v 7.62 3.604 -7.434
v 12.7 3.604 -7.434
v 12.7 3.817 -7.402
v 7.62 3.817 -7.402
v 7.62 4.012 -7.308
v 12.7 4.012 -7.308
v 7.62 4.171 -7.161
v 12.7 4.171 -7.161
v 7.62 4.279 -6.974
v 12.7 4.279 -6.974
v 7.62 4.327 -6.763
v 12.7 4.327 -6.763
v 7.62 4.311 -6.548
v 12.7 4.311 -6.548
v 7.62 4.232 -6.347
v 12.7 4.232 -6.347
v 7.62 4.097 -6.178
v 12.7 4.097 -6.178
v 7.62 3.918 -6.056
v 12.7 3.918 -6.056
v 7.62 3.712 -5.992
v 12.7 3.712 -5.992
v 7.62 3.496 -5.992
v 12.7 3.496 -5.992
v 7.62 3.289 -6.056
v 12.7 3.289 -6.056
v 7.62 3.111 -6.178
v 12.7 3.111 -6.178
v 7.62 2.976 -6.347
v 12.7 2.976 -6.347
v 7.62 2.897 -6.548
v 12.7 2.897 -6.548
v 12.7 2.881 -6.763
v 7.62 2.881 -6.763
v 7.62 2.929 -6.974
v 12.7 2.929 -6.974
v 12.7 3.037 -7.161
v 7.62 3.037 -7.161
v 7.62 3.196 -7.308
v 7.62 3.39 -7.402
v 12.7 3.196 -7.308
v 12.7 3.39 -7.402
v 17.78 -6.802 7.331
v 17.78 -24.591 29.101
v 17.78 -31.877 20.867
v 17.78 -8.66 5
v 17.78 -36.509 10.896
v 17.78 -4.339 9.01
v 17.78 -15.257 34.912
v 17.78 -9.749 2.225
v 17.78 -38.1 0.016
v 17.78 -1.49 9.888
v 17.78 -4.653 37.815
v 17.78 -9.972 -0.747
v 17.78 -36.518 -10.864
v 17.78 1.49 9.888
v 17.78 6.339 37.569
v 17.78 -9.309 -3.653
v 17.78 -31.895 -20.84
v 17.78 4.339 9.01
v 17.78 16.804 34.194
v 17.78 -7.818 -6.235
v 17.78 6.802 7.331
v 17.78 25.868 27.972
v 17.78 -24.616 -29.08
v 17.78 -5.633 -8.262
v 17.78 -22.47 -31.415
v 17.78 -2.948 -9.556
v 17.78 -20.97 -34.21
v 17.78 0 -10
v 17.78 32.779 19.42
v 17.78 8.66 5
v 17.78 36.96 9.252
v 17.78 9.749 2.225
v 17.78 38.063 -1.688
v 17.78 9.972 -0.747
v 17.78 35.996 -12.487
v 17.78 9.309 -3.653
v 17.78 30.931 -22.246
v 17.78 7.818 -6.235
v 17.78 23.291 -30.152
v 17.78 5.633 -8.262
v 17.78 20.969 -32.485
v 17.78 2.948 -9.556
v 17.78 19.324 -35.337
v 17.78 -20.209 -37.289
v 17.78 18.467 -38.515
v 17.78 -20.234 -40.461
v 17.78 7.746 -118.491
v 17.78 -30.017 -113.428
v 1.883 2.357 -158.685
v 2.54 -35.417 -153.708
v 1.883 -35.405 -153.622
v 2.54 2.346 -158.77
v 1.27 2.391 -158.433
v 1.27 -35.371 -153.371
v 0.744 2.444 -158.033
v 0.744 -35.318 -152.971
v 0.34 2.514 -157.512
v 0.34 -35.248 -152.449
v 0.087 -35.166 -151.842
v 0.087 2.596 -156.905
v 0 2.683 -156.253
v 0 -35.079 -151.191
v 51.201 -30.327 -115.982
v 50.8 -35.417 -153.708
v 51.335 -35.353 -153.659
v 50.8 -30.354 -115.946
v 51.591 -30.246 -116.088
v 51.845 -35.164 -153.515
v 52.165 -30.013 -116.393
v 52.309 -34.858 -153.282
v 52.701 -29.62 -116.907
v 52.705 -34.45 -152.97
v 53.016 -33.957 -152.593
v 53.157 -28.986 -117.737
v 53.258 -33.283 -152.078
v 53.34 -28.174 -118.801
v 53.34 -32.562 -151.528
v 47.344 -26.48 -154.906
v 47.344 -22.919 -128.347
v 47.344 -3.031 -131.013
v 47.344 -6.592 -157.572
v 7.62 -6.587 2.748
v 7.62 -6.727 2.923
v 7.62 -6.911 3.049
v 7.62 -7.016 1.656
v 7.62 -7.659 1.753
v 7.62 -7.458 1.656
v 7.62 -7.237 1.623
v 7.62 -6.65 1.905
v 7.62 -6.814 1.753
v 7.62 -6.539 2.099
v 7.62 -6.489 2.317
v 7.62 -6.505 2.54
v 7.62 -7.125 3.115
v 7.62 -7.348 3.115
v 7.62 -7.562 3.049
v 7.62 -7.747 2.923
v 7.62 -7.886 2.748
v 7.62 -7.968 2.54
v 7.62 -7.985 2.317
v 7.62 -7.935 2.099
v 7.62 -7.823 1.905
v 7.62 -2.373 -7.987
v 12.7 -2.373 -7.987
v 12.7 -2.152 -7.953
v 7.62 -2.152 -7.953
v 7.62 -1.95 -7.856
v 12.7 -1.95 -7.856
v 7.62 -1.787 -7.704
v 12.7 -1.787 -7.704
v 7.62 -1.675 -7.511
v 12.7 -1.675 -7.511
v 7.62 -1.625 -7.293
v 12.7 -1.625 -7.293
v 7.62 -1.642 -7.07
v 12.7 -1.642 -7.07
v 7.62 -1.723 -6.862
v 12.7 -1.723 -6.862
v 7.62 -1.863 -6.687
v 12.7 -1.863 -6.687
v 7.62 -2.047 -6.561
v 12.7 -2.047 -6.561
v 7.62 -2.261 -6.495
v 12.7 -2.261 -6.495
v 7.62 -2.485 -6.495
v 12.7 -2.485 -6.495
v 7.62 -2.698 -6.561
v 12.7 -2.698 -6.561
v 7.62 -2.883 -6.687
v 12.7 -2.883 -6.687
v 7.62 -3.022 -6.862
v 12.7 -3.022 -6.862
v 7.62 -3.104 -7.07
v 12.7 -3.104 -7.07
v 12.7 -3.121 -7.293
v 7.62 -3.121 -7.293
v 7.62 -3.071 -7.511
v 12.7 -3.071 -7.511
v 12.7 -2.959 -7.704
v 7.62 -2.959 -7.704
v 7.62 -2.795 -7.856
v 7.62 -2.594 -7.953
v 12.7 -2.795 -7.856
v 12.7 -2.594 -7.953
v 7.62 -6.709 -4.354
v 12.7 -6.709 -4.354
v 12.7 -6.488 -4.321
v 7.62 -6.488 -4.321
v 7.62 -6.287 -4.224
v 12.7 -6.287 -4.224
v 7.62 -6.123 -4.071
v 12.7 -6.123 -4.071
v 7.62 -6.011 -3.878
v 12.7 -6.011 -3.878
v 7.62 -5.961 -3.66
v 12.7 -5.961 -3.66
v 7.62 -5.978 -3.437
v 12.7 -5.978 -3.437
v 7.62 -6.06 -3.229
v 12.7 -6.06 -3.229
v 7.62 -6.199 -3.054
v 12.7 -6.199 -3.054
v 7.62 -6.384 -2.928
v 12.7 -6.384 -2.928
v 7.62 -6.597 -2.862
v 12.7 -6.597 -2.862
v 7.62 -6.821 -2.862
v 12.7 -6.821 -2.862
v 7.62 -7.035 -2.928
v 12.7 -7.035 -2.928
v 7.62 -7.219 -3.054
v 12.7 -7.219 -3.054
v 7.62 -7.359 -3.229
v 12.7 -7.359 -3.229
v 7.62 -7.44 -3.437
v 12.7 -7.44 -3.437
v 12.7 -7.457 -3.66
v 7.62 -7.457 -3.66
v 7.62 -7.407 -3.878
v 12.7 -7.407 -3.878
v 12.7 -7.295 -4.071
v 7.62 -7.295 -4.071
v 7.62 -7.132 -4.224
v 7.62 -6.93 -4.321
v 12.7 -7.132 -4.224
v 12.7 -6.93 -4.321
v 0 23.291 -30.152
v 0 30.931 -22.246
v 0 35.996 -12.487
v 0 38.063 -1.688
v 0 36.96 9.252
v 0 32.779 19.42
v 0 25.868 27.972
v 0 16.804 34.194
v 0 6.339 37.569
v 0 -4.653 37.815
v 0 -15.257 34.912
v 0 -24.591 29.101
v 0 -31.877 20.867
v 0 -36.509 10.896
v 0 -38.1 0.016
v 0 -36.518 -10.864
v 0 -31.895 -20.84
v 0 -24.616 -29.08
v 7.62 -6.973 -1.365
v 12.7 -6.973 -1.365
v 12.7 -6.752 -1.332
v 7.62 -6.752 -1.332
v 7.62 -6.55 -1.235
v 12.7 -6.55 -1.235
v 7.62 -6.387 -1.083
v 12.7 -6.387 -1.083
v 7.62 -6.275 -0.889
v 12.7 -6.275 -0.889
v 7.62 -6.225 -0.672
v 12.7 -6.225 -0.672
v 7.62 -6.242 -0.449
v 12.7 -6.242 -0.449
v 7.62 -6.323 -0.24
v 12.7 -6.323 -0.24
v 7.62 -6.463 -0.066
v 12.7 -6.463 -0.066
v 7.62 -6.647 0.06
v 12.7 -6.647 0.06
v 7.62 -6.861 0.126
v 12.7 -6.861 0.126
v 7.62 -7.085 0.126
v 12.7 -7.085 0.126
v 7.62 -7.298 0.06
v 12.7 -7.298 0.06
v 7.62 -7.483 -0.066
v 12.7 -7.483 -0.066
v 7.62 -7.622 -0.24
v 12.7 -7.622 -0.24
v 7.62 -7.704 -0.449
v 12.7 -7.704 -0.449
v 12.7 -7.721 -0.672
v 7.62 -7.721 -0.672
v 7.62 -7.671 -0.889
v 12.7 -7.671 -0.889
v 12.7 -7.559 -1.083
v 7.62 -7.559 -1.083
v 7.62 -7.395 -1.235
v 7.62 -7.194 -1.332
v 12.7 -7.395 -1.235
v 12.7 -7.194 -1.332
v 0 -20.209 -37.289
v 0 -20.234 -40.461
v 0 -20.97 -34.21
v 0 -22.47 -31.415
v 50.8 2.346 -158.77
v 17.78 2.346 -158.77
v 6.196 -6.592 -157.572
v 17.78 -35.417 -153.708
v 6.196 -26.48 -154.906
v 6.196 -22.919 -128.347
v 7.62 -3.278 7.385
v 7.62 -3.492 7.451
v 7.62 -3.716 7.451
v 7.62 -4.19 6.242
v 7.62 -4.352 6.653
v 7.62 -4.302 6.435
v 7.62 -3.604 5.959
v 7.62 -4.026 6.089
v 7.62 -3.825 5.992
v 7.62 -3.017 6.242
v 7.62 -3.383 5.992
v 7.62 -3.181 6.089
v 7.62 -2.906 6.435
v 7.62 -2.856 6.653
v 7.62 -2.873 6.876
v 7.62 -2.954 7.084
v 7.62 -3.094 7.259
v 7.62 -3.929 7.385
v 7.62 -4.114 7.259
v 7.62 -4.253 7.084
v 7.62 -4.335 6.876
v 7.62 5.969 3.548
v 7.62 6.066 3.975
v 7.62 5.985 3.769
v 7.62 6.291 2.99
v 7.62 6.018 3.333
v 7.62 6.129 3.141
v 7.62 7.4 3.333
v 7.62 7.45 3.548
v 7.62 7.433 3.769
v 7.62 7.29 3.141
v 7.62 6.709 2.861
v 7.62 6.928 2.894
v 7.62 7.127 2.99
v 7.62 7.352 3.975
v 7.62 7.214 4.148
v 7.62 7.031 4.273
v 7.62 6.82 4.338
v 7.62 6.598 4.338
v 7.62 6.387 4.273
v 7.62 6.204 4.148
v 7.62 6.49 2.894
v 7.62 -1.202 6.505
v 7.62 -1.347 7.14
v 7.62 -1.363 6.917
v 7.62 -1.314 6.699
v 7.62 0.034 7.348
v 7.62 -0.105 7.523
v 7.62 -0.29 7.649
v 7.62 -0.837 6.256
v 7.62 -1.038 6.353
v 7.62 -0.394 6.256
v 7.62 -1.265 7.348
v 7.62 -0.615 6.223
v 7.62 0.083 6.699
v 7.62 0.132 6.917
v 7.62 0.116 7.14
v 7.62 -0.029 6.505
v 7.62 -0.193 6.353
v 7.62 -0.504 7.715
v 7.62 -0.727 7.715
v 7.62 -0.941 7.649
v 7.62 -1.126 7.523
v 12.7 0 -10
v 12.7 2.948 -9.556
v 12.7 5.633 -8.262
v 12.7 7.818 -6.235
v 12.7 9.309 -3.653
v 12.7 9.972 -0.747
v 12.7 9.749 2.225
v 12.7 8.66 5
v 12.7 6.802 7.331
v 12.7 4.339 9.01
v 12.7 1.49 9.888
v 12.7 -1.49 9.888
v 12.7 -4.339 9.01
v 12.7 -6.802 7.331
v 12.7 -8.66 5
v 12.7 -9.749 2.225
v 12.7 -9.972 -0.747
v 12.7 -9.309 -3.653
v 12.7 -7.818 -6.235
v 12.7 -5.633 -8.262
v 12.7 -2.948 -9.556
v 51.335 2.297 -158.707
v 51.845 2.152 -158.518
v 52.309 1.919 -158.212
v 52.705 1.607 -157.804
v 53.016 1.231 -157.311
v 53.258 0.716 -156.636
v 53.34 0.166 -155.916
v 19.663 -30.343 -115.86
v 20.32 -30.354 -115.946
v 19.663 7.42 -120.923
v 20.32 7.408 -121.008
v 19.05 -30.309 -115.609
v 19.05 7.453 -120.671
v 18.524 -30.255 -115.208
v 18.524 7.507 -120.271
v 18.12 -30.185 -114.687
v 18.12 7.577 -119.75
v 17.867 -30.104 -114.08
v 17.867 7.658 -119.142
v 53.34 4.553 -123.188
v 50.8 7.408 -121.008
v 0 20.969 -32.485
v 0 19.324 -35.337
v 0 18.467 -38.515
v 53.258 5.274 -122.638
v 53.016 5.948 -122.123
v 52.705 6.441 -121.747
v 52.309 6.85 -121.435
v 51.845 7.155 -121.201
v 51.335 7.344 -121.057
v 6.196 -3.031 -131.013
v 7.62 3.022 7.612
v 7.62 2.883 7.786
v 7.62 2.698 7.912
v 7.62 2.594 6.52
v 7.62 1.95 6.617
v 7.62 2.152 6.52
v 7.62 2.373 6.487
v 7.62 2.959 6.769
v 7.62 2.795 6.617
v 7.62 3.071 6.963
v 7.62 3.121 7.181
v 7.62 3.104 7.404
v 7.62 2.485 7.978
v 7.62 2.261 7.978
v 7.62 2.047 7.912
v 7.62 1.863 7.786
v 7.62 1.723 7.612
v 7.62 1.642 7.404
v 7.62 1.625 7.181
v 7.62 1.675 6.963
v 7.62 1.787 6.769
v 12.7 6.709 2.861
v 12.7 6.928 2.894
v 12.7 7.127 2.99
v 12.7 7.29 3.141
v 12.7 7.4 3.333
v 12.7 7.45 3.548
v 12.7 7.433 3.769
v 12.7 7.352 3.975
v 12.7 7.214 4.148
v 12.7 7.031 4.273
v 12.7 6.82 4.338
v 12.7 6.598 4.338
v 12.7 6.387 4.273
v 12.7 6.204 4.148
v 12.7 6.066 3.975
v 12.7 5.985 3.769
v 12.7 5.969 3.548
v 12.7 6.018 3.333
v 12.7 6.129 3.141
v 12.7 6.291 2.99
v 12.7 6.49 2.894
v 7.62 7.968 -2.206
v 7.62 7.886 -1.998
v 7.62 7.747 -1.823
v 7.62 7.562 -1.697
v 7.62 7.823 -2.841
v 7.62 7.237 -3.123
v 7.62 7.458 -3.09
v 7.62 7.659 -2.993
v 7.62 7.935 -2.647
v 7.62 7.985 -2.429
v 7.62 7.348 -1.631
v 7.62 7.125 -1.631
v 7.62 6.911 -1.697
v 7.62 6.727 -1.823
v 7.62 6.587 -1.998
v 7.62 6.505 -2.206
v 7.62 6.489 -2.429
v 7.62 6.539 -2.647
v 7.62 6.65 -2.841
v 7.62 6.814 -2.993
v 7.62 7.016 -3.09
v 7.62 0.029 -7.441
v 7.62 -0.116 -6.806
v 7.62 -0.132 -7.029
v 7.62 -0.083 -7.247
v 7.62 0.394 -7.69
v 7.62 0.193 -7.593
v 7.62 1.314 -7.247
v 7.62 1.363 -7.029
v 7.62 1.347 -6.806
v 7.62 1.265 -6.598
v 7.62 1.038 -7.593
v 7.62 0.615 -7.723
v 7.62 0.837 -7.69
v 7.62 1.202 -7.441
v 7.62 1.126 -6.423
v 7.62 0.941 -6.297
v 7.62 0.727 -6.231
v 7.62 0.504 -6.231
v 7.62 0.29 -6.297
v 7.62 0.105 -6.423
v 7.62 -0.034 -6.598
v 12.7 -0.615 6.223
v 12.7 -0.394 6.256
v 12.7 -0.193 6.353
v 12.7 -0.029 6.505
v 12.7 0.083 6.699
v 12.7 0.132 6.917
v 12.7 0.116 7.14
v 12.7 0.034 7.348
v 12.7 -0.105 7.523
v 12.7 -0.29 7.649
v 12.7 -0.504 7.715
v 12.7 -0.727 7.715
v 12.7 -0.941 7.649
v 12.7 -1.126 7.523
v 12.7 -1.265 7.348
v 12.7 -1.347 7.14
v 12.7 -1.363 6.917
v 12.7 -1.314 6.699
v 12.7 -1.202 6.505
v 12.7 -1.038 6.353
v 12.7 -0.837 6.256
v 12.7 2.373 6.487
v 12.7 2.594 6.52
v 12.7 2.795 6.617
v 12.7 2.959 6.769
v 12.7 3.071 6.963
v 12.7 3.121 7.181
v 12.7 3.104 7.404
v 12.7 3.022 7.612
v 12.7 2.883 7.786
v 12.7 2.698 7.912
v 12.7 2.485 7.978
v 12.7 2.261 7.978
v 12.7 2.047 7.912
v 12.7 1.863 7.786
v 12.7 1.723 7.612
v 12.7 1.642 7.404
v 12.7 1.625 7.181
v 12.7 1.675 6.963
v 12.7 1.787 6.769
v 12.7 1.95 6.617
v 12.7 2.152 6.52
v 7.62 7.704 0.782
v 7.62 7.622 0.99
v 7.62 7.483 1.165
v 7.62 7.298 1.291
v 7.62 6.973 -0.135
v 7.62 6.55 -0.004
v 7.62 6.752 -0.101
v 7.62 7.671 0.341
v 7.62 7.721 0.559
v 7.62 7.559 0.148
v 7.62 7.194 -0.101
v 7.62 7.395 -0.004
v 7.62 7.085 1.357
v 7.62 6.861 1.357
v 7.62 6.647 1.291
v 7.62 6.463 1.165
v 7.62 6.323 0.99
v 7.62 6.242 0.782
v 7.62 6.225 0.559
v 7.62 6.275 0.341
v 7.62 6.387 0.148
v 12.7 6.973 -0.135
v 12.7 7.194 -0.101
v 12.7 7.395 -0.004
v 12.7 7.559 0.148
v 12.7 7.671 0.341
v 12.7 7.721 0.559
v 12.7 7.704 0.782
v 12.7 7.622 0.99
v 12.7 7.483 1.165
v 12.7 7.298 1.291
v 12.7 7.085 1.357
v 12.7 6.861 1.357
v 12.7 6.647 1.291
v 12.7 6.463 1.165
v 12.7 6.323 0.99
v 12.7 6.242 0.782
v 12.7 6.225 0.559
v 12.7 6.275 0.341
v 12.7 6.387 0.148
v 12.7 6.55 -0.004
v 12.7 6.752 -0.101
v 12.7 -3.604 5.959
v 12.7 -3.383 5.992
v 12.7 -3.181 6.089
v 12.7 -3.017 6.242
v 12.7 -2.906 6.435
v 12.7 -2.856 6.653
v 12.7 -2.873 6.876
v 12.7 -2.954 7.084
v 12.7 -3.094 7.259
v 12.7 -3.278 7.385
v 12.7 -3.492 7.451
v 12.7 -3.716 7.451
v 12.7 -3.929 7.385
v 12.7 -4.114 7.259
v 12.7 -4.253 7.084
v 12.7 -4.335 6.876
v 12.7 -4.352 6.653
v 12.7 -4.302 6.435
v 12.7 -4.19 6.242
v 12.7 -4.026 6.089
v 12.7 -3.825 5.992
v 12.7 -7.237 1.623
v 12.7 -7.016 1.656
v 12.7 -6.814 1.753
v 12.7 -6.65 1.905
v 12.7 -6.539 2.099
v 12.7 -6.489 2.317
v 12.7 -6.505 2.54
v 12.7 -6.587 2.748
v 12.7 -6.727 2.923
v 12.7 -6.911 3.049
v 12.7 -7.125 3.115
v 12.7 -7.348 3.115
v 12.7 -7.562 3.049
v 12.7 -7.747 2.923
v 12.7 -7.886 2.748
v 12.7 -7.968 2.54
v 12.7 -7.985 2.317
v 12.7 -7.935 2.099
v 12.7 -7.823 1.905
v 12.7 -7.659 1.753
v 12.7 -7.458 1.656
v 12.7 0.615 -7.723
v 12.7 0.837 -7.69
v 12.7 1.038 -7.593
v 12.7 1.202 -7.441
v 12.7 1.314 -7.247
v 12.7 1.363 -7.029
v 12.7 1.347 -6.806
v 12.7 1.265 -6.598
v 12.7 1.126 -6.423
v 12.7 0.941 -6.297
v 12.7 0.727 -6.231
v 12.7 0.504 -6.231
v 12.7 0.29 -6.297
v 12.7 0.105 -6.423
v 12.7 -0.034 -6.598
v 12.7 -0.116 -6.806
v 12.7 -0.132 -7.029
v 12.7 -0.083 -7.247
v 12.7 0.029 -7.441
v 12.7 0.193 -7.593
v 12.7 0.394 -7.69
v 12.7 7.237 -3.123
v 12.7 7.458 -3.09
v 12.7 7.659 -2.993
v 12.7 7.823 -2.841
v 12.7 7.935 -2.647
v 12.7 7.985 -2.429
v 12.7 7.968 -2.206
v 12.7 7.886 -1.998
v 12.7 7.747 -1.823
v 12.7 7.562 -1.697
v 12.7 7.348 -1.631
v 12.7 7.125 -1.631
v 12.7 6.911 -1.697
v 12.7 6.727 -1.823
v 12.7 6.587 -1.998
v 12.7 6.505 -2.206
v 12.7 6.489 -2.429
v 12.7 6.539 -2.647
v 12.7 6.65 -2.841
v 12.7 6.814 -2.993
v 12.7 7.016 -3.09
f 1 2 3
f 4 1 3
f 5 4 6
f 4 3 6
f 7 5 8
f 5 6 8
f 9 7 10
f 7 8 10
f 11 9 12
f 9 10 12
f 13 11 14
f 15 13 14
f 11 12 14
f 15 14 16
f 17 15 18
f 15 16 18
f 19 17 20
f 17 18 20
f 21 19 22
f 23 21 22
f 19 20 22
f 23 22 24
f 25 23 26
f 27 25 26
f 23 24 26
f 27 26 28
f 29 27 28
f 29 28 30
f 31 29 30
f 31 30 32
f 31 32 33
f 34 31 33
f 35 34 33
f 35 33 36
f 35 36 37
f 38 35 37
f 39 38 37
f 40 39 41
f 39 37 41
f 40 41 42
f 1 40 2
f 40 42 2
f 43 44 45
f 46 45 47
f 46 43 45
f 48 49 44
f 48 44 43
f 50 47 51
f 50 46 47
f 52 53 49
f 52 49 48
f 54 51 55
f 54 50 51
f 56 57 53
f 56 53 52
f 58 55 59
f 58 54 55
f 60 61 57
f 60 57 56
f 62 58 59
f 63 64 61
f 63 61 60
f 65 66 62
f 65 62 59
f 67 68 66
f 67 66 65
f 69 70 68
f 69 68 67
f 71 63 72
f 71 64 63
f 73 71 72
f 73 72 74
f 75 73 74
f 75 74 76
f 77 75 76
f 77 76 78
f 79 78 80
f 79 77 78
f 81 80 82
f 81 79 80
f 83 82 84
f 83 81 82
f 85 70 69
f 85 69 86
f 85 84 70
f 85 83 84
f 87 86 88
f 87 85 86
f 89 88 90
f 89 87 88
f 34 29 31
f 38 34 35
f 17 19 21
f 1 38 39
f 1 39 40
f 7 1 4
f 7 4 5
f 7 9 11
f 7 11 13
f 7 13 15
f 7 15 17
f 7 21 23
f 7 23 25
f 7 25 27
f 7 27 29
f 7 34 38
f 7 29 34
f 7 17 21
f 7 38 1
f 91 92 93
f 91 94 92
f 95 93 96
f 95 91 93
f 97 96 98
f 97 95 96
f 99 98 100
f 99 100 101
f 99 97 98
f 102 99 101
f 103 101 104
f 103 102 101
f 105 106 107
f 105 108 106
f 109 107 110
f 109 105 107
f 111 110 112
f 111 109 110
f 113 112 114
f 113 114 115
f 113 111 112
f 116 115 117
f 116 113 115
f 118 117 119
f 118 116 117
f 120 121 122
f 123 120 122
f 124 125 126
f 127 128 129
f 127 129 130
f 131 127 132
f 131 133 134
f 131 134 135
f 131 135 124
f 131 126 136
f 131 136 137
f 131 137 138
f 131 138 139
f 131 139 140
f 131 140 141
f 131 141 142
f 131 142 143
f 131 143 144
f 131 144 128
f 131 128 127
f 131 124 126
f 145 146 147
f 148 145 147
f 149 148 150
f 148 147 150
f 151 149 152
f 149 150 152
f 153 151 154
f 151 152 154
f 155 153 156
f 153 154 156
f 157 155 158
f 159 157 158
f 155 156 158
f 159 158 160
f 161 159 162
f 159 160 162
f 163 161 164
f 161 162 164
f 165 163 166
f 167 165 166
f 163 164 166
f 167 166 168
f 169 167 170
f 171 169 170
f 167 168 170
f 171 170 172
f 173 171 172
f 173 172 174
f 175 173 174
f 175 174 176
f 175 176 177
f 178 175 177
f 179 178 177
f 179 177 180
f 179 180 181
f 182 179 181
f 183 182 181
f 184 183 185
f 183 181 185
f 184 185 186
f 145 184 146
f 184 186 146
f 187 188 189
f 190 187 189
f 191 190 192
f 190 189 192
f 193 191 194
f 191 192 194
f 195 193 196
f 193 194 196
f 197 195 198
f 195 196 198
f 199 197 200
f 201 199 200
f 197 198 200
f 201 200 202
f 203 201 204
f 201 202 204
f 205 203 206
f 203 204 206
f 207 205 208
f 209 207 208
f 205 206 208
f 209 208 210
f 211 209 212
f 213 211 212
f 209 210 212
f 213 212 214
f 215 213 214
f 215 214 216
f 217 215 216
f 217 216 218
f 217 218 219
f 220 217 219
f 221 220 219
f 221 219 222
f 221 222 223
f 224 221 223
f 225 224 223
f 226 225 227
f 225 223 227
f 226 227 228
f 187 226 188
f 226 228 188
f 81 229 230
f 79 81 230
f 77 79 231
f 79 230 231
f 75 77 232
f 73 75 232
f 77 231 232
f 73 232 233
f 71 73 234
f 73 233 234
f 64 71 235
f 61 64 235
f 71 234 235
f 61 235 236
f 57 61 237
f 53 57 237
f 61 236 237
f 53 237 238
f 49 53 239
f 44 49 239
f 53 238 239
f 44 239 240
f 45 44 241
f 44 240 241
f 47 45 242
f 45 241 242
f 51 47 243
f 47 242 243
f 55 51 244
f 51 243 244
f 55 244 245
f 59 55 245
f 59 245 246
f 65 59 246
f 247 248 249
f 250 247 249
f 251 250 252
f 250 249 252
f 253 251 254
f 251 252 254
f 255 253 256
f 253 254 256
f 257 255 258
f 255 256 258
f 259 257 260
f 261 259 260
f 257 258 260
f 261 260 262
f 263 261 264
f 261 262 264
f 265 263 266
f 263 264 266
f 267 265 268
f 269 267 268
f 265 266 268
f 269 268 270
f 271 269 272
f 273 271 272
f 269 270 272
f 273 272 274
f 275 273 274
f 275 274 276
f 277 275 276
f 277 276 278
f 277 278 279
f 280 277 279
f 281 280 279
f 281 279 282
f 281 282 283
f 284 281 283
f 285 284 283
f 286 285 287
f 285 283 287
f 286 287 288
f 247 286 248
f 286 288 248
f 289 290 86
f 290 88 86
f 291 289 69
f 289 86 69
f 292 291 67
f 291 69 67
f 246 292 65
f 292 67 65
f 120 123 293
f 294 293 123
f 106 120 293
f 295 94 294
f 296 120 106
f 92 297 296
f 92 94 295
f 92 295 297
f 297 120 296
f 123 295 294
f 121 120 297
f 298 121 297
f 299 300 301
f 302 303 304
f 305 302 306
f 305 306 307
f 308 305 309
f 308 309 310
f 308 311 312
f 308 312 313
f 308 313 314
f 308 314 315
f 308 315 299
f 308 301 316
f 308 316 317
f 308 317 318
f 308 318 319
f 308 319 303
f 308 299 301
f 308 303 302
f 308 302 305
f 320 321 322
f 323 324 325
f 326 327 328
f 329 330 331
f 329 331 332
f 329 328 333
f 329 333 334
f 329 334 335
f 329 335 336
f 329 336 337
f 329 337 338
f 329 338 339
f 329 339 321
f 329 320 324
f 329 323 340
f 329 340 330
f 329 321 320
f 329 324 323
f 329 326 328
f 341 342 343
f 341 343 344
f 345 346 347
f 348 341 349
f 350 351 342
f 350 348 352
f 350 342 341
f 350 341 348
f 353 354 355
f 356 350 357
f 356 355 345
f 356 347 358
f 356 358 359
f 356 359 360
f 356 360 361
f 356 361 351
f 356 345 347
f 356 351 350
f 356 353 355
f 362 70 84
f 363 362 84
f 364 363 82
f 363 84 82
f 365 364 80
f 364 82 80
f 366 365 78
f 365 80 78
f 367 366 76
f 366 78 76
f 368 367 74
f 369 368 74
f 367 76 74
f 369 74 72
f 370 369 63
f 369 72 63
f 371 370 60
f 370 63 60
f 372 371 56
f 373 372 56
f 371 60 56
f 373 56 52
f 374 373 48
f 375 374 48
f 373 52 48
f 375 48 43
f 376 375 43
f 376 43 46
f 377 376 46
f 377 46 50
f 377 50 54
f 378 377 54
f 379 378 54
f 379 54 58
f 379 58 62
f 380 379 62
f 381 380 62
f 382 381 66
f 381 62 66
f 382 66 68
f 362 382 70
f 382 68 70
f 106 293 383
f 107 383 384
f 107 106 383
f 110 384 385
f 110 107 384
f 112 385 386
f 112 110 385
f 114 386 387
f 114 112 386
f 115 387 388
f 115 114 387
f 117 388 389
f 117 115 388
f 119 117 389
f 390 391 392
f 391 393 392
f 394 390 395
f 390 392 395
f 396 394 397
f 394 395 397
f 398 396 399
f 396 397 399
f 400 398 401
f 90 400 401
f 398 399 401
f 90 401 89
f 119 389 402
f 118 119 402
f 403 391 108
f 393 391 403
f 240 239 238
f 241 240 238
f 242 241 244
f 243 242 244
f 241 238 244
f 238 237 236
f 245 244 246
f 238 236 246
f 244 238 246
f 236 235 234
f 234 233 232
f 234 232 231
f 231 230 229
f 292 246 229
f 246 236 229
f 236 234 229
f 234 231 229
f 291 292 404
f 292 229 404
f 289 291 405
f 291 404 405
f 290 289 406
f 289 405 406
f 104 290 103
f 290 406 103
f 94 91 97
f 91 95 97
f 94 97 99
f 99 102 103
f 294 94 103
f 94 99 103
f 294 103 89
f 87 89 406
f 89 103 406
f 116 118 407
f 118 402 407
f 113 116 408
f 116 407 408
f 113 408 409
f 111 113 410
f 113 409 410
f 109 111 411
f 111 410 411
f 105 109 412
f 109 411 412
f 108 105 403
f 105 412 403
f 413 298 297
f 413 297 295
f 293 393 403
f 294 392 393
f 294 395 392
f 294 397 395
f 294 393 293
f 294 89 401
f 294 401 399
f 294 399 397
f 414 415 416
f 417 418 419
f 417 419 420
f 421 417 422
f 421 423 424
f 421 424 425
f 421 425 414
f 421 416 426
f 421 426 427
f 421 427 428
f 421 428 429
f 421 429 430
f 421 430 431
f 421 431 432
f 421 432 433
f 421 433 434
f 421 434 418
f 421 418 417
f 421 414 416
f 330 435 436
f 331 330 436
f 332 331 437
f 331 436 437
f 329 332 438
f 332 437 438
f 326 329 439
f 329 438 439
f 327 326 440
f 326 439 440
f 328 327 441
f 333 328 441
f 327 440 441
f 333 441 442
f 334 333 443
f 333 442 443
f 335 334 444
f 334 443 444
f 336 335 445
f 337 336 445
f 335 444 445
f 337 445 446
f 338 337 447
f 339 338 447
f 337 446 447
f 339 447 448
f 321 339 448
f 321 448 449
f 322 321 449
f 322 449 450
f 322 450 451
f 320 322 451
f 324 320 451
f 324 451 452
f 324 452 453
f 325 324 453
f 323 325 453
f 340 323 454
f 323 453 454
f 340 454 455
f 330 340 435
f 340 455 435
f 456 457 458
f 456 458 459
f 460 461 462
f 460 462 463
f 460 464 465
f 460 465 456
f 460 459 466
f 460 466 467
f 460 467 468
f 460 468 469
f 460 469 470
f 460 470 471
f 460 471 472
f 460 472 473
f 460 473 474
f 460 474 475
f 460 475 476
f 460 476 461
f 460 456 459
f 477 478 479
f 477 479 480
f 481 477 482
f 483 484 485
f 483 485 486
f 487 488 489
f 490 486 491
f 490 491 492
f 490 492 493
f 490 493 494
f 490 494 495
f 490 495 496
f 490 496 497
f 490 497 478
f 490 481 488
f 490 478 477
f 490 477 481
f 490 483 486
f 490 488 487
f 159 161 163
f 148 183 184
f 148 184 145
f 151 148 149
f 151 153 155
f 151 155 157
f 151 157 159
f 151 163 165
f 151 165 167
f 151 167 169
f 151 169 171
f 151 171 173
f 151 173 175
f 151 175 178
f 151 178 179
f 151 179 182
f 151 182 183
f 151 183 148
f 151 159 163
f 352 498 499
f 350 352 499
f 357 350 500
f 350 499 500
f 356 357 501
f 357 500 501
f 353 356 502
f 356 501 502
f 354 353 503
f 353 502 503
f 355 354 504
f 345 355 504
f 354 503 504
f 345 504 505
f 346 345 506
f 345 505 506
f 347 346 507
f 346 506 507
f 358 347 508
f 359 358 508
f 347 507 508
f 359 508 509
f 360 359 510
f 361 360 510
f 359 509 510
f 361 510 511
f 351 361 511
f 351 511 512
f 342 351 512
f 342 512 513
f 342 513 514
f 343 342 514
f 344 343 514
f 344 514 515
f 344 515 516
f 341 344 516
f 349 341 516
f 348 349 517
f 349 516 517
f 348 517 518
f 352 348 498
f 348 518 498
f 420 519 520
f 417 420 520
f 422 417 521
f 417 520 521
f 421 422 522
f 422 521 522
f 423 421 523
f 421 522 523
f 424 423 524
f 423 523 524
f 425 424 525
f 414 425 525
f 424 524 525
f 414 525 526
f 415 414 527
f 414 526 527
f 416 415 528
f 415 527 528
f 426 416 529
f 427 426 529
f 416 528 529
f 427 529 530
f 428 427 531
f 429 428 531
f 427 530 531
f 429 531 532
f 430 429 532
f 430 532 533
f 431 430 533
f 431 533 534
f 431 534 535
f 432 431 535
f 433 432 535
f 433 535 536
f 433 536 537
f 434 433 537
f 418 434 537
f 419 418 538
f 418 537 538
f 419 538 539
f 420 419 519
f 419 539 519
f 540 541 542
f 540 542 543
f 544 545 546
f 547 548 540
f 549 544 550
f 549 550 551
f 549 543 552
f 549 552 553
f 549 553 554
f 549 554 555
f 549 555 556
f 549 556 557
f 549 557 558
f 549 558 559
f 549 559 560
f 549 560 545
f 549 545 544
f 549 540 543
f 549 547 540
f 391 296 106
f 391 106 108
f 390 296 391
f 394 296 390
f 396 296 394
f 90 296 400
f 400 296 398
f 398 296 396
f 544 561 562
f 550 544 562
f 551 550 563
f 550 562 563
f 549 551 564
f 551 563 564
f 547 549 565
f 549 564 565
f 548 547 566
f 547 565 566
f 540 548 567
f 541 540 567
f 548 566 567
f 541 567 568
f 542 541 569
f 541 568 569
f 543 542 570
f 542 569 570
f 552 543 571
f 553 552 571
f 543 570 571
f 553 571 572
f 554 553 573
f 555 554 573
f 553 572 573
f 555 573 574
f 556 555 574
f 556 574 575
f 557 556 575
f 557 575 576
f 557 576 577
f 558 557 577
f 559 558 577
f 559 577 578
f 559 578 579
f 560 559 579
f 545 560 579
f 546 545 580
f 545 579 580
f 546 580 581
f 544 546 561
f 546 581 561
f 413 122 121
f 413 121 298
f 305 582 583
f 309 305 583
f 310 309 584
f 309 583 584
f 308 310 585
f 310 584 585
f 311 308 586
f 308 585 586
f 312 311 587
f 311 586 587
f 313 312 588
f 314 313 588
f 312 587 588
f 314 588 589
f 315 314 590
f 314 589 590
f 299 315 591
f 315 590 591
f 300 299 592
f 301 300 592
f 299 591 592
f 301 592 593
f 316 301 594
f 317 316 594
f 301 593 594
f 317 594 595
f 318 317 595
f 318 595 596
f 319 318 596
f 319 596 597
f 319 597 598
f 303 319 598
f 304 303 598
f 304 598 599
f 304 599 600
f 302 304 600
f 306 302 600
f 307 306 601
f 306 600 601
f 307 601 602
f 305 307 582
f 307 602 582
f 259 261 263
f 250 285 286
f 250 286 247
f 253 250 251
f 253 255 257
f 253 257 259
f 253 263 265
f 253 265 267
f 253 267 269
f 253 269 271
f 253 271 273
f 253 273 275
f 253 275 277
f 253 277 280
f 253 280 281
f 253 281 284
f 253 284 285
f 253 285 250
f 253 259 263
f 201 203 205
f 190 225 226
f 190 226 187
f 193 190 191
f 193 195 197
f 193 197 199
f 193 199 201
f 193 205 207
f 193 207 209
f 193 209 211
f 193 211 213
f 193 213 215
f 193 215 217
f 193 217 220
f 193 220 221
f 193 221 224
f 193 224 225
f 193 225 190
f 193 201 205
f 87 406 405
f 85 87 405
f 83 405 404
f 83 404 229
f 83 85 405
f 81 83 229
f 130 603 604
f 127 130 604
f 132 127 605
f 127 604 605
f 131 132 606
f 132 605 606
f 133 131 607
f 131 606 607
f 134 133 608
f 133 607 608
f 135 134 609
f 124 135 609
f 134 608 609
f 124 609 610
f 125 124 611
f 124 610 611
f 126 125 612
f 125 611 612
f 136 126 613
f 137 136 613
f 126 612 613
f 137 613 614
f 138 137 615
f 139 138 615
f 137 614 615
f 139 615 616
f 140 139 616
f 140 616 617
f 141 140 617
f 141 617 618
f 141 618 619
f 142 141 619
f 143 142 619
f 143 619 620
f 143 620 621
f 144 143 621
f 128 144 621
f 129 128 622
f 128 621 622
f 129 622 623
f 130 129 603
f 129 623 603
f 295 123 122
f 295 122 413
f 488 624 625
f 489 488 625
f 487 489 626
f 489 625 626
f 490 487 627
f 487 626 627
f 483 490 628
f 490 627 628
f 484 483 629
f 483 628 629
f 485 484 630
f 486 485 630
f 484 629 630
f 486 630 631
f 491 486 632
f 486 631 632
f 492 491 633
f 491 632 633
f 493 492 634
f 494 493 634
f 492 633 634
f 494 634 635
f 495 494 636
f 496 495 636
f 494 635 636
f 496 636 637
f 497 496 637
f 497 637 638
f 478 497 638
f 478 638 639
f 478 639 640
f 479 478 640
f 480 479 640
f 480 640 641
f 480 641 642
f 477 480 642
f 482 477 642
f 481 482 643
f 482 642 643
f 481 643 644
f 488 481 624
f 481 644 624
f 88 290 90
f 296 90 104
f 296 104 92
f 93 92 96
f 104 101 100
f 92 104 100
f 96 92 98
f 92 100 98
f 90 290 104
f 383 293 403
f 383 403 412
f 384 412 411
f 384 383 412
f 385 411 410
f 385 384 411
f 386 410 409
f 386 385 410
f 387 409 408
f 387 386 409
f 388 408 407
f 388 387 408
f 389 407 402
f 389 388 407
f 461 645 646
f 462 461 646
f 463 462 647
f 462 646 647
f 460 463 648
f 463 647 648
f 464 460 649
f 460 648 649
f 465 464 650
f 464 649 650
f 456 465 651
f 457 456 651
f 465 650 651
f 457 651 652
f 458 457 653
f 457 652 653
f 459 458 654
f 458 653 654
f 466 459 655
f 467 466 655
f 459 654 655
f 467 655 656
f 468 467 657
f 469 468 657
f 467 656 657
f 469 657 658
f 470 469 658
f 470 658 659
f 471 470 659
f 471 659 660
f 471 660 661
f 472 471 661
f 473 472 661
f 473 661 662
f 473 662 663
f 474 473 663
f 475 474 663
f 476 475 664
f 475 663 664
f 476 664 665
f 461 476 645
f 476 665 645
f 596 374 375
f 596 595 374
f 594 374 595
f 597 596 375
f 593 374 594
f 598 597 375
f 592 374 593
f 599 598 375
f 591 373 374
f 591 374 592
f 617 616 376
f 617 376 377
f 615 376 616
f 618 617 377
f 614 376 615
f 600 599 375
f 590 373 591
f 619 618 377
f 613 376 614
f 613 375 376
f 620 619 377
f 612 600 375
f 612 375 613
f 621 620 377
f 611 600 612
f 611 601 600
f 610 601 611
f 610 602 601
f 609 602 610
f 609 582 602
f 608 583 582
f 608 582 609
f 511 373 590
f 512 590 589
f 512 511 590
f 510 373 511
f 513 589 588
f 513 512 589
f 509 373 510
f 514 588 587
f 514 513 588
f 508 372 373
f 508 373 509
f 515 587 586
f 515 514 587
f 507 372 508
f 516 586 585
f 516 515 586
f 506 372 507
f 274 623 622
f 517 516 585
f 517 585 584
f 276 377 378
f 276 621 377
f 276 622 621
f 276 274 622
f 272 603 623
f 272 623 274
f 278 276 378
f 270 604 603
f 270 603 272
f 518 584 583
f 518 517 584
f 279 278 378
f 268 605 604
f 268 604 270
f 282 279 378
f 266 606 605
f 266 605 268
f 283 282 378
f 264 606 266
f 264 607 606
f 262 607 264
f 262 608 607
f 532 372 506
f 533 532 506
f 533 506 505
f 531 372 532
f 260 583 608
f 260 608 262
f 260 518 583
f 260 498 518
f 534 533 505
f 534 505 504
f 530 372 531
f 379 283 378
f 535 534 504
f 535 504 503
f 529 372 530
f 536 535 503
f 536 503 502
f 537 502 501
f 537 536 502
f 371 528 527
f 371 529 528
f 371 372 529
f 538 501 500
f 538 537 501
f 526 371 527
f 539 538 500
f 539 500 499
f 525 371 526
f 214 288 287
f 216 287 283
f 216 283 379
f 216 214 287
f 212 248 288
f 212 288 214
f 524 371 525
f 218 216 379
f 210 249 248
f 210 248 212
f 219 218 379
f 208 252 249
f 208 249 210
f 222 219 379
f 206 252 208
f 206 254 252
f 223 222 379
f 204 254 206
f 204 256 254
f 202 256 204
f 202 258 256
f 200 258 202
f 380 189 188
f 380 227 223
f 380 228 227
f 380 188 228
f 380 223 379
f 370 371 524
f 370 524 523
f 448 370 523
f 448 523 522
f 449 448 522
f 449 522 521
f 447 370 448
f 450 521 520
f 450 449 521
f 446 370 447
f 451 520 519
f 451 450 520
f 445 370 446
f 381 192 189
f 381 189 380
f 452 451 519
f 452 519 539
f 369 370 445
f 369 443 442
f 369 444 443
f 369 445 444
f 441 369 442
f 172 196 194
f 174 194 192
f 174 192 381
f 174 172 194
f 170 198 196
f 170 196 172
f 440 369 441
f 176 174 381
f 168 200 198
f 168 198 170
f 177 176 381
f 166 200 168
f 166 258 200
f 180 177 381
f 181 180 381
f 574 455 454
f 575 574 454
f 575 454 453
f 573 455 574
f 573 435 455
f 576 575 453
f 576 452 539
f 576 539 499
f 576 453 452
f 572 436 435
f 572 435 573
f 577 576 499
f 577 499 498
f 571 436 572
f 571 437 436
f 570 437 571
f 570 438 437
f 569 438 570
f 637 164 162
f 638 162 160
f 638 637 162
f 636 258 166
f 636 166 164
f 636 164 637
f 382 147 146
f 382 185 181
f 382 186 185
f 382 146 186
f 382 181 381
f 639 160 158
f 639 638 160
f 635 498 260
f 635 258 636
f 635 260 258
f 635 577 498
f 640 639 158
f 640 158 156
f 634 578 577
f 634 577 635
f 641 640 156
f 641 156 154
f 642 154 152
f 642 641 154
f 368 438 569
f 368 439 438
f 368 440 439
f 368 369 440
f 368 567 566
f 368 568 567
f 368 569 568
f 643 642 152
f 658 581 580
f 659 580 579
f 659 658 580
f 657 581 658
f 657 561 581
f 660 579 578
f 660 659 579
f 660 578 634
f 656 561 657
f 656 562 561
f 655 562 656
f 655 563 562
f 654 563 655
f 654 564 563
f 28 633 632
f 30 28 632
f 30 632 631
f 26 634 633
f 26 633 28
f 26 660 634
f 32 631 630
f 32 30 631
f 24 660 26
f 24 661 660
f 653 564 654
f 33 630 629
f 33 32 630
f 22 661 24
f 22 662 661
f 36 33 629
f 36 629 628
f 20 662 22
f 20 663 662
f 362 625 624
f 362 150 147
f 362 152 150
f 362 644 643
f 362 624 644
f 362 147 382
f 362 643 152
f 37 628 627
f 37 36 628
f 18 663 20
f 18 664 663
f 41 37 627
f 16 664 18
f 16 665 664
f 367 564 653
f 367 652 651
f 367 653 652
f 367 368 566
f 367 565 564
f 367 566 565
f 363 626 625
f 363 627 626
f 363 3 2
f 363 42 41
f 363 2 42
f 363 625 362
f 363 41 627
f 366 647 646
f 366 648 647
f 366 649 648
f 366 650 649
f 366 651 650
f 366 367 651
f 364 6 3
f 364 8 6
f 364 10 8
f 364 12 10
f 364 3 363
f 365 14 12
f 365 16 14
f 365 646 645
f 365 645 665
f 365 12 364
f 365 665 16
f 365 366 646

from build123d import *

# Parameters (mm, degrees)
BOSS_EXTRUDE1_DEPTH = 17.78
SKETCH2_R           = 10
CUT_EXTRUDE2_DEPTH  = 5.08
SKETCH8_R           = 0.75
SKETCH8_R_2         = 0.724827396
SKETCH8_R_3         = 0.742534986
CUT_EXTRUDE7_DEPTH  = 5.08
BOSS_EXTRUDE2_DEPTH = 35.56
SKETCH7_W           = 41.148
SKETCH7_H           = 20.066
CUT_EXTRUDE5_DEPTH  = 26.797
FILLET2_R           = 2.54
FILLET3_R           = 2.54
FILLET4_R           = 2.54
FILLET5_R           = 12.7


with BuildPart() as part:
    # Sketch1 → Boss-Extrude1 (new body)
    with BuildSketch(Plane(origin=(0, 0, 0), x_dir=(0, 0, -1), z_dir=(1, 0, 0))):
        with BuildLine():
            Line((32.896583501, -19.220426478), (153.708015153, -35.416630381))
            Line((153.708015153, -35.416630381), (158.7704814, 2.345538988))
            Line((158.7704814, 2.345538988), (32.896583501, 19.220426478))
            ThreePointArc((32.896583501, 19.220426478), (-38.1, 0), (32.896583501, -19.220426478))
        make_face()
    extrude(amount=BOSS_EXTRUDE1_DEPTH)

    # Sketch2 → Cut-Extrude2 (cut)
    with BuildSketch(Plane(origin=(17.78, 0, 0), x_dir=(0, 0, -1), z_dir=(1, 0, 0))):
        Circle(SKETCH2_R)
    extrude(amount=-CUT_EXTRUDE2_DEPTH, mode=Mode.SUBTRACT)

    # Sketch8 → Cut-Extrude7 (cut)
    with BuildSketch(Plane(origin=(12.7, 0, 0), x_dir=(0, 0, -1), z_dir=(1, 0, 0))):
        with Locations((-7.236662764, 2.372912145)):
            Circle(SKETCH8_R)
        with Locations((-6.97289018, -0.615469361)):
            Circle(SKETCH8_R)
        with Locations((-6.709117597, -3.603850867)):
            Circle(SKETCH8_R)
        with Locations((-2.372912145, -7.236662764)):
            Circle(SKETCH8_R)
        with Locations((0.615469361, -6.97289018)):
            Circle(SKETCH8_R)
        with Locations((3.603850867, -6.709117597)):
            Circle(SKETCH8_R)
        with Locations((7.236662764, -2.372912145)):
            Circle(SKETCH8_R)
        with Locations((6.97289018, 0.615469361)):
            Circle(SKETCH8_R)
        with Locations((6.709117597, 3.603850867)):
            Circle(SKETCH8_R_2)
        with Locations((2.372912145, 7.236662764)):
            Circle(SKETCH8_R)
        with Locations((-0.615469361, 6.97289018)):
            Circle(SKETCH8_R)
        with Locations((-3.603850867, 6.709117597)):
            Circle(SKETCH8_R_3)
    extrude(amount=-CUT_EXTRUDE7_DEPTH, mode=Mode.SUBTRACT)

    # Sketch4 → Boss-Extrude2 (add)
    with BuildSketch(Plane(origin=(17.78, 0, 0), x_dir=(0, 0, -1), z_dir=(1, 0, 0))):
        Polygon((158.7704814, 2.345538988), (153.708015153, -35.416630381), (115.945845783, -30.354164135), (121.00831203, 7.408005235), align=None)
    extrude(amount=BOSS_EXTRUDE2_DEPTH)

    # Sketch7 → Cut-Extrude5 (cut)
    with BuildSketch(Plane(origin=(0, -20.867859649, -155.658450257), x_dir=(-1, 0, 0), z_dir=(0, -0.1328731298372059, -0.9911330543207936))):
        with Locations((-26.769839531, 4.371072011)):
            Rectangle(SKETCH7_W, SKETCH7_H)
    extrude(amount=-CUT_EXTRUDE5_DEPTH, mode=Mode.SUBTRACT)

    # Fillet2
    fillet2_edges = [part.edges().sort_by_distance(p)[0] for p in [
        (17.78, -11.47307945, -118.477078906),
    ]]
    fillet(fillet2_edges, radius=FILLET2_R)

    # Fillet3
    fillet3_edges = [part.edges().sort_by_distance(p)[0] for p in [
        (53.34, 4.876772112, -139.889396715),
        (53.34, -11.47307945, -118.477078906),
        (53.34, -32.885397258, -134.826930468),
        (53.34, -16.535545697, -156.239248276),
    ]]
    fillet(fillet3_edges, radius=FILLET3_R)

    # Fillet4
    fillet4_edges = [part.edges().sort_by_distance(p)[0] for p in [
        (0, -16.535545697, -156.239248276),
    ]]
    fillet(fillet4_edges, radius=FILLET4_R)

    # Fillet5
    fillet5_edges = [part.edges().sort_by_distance(p)[0] for p in [
        (8.89, -19.220426478, -32.896583501),
        (8.89, 19.220426478, -32.896583501),
    ]]
    fillet(fillet5_edges, radius=FILLET5_R)


solid = part.part
